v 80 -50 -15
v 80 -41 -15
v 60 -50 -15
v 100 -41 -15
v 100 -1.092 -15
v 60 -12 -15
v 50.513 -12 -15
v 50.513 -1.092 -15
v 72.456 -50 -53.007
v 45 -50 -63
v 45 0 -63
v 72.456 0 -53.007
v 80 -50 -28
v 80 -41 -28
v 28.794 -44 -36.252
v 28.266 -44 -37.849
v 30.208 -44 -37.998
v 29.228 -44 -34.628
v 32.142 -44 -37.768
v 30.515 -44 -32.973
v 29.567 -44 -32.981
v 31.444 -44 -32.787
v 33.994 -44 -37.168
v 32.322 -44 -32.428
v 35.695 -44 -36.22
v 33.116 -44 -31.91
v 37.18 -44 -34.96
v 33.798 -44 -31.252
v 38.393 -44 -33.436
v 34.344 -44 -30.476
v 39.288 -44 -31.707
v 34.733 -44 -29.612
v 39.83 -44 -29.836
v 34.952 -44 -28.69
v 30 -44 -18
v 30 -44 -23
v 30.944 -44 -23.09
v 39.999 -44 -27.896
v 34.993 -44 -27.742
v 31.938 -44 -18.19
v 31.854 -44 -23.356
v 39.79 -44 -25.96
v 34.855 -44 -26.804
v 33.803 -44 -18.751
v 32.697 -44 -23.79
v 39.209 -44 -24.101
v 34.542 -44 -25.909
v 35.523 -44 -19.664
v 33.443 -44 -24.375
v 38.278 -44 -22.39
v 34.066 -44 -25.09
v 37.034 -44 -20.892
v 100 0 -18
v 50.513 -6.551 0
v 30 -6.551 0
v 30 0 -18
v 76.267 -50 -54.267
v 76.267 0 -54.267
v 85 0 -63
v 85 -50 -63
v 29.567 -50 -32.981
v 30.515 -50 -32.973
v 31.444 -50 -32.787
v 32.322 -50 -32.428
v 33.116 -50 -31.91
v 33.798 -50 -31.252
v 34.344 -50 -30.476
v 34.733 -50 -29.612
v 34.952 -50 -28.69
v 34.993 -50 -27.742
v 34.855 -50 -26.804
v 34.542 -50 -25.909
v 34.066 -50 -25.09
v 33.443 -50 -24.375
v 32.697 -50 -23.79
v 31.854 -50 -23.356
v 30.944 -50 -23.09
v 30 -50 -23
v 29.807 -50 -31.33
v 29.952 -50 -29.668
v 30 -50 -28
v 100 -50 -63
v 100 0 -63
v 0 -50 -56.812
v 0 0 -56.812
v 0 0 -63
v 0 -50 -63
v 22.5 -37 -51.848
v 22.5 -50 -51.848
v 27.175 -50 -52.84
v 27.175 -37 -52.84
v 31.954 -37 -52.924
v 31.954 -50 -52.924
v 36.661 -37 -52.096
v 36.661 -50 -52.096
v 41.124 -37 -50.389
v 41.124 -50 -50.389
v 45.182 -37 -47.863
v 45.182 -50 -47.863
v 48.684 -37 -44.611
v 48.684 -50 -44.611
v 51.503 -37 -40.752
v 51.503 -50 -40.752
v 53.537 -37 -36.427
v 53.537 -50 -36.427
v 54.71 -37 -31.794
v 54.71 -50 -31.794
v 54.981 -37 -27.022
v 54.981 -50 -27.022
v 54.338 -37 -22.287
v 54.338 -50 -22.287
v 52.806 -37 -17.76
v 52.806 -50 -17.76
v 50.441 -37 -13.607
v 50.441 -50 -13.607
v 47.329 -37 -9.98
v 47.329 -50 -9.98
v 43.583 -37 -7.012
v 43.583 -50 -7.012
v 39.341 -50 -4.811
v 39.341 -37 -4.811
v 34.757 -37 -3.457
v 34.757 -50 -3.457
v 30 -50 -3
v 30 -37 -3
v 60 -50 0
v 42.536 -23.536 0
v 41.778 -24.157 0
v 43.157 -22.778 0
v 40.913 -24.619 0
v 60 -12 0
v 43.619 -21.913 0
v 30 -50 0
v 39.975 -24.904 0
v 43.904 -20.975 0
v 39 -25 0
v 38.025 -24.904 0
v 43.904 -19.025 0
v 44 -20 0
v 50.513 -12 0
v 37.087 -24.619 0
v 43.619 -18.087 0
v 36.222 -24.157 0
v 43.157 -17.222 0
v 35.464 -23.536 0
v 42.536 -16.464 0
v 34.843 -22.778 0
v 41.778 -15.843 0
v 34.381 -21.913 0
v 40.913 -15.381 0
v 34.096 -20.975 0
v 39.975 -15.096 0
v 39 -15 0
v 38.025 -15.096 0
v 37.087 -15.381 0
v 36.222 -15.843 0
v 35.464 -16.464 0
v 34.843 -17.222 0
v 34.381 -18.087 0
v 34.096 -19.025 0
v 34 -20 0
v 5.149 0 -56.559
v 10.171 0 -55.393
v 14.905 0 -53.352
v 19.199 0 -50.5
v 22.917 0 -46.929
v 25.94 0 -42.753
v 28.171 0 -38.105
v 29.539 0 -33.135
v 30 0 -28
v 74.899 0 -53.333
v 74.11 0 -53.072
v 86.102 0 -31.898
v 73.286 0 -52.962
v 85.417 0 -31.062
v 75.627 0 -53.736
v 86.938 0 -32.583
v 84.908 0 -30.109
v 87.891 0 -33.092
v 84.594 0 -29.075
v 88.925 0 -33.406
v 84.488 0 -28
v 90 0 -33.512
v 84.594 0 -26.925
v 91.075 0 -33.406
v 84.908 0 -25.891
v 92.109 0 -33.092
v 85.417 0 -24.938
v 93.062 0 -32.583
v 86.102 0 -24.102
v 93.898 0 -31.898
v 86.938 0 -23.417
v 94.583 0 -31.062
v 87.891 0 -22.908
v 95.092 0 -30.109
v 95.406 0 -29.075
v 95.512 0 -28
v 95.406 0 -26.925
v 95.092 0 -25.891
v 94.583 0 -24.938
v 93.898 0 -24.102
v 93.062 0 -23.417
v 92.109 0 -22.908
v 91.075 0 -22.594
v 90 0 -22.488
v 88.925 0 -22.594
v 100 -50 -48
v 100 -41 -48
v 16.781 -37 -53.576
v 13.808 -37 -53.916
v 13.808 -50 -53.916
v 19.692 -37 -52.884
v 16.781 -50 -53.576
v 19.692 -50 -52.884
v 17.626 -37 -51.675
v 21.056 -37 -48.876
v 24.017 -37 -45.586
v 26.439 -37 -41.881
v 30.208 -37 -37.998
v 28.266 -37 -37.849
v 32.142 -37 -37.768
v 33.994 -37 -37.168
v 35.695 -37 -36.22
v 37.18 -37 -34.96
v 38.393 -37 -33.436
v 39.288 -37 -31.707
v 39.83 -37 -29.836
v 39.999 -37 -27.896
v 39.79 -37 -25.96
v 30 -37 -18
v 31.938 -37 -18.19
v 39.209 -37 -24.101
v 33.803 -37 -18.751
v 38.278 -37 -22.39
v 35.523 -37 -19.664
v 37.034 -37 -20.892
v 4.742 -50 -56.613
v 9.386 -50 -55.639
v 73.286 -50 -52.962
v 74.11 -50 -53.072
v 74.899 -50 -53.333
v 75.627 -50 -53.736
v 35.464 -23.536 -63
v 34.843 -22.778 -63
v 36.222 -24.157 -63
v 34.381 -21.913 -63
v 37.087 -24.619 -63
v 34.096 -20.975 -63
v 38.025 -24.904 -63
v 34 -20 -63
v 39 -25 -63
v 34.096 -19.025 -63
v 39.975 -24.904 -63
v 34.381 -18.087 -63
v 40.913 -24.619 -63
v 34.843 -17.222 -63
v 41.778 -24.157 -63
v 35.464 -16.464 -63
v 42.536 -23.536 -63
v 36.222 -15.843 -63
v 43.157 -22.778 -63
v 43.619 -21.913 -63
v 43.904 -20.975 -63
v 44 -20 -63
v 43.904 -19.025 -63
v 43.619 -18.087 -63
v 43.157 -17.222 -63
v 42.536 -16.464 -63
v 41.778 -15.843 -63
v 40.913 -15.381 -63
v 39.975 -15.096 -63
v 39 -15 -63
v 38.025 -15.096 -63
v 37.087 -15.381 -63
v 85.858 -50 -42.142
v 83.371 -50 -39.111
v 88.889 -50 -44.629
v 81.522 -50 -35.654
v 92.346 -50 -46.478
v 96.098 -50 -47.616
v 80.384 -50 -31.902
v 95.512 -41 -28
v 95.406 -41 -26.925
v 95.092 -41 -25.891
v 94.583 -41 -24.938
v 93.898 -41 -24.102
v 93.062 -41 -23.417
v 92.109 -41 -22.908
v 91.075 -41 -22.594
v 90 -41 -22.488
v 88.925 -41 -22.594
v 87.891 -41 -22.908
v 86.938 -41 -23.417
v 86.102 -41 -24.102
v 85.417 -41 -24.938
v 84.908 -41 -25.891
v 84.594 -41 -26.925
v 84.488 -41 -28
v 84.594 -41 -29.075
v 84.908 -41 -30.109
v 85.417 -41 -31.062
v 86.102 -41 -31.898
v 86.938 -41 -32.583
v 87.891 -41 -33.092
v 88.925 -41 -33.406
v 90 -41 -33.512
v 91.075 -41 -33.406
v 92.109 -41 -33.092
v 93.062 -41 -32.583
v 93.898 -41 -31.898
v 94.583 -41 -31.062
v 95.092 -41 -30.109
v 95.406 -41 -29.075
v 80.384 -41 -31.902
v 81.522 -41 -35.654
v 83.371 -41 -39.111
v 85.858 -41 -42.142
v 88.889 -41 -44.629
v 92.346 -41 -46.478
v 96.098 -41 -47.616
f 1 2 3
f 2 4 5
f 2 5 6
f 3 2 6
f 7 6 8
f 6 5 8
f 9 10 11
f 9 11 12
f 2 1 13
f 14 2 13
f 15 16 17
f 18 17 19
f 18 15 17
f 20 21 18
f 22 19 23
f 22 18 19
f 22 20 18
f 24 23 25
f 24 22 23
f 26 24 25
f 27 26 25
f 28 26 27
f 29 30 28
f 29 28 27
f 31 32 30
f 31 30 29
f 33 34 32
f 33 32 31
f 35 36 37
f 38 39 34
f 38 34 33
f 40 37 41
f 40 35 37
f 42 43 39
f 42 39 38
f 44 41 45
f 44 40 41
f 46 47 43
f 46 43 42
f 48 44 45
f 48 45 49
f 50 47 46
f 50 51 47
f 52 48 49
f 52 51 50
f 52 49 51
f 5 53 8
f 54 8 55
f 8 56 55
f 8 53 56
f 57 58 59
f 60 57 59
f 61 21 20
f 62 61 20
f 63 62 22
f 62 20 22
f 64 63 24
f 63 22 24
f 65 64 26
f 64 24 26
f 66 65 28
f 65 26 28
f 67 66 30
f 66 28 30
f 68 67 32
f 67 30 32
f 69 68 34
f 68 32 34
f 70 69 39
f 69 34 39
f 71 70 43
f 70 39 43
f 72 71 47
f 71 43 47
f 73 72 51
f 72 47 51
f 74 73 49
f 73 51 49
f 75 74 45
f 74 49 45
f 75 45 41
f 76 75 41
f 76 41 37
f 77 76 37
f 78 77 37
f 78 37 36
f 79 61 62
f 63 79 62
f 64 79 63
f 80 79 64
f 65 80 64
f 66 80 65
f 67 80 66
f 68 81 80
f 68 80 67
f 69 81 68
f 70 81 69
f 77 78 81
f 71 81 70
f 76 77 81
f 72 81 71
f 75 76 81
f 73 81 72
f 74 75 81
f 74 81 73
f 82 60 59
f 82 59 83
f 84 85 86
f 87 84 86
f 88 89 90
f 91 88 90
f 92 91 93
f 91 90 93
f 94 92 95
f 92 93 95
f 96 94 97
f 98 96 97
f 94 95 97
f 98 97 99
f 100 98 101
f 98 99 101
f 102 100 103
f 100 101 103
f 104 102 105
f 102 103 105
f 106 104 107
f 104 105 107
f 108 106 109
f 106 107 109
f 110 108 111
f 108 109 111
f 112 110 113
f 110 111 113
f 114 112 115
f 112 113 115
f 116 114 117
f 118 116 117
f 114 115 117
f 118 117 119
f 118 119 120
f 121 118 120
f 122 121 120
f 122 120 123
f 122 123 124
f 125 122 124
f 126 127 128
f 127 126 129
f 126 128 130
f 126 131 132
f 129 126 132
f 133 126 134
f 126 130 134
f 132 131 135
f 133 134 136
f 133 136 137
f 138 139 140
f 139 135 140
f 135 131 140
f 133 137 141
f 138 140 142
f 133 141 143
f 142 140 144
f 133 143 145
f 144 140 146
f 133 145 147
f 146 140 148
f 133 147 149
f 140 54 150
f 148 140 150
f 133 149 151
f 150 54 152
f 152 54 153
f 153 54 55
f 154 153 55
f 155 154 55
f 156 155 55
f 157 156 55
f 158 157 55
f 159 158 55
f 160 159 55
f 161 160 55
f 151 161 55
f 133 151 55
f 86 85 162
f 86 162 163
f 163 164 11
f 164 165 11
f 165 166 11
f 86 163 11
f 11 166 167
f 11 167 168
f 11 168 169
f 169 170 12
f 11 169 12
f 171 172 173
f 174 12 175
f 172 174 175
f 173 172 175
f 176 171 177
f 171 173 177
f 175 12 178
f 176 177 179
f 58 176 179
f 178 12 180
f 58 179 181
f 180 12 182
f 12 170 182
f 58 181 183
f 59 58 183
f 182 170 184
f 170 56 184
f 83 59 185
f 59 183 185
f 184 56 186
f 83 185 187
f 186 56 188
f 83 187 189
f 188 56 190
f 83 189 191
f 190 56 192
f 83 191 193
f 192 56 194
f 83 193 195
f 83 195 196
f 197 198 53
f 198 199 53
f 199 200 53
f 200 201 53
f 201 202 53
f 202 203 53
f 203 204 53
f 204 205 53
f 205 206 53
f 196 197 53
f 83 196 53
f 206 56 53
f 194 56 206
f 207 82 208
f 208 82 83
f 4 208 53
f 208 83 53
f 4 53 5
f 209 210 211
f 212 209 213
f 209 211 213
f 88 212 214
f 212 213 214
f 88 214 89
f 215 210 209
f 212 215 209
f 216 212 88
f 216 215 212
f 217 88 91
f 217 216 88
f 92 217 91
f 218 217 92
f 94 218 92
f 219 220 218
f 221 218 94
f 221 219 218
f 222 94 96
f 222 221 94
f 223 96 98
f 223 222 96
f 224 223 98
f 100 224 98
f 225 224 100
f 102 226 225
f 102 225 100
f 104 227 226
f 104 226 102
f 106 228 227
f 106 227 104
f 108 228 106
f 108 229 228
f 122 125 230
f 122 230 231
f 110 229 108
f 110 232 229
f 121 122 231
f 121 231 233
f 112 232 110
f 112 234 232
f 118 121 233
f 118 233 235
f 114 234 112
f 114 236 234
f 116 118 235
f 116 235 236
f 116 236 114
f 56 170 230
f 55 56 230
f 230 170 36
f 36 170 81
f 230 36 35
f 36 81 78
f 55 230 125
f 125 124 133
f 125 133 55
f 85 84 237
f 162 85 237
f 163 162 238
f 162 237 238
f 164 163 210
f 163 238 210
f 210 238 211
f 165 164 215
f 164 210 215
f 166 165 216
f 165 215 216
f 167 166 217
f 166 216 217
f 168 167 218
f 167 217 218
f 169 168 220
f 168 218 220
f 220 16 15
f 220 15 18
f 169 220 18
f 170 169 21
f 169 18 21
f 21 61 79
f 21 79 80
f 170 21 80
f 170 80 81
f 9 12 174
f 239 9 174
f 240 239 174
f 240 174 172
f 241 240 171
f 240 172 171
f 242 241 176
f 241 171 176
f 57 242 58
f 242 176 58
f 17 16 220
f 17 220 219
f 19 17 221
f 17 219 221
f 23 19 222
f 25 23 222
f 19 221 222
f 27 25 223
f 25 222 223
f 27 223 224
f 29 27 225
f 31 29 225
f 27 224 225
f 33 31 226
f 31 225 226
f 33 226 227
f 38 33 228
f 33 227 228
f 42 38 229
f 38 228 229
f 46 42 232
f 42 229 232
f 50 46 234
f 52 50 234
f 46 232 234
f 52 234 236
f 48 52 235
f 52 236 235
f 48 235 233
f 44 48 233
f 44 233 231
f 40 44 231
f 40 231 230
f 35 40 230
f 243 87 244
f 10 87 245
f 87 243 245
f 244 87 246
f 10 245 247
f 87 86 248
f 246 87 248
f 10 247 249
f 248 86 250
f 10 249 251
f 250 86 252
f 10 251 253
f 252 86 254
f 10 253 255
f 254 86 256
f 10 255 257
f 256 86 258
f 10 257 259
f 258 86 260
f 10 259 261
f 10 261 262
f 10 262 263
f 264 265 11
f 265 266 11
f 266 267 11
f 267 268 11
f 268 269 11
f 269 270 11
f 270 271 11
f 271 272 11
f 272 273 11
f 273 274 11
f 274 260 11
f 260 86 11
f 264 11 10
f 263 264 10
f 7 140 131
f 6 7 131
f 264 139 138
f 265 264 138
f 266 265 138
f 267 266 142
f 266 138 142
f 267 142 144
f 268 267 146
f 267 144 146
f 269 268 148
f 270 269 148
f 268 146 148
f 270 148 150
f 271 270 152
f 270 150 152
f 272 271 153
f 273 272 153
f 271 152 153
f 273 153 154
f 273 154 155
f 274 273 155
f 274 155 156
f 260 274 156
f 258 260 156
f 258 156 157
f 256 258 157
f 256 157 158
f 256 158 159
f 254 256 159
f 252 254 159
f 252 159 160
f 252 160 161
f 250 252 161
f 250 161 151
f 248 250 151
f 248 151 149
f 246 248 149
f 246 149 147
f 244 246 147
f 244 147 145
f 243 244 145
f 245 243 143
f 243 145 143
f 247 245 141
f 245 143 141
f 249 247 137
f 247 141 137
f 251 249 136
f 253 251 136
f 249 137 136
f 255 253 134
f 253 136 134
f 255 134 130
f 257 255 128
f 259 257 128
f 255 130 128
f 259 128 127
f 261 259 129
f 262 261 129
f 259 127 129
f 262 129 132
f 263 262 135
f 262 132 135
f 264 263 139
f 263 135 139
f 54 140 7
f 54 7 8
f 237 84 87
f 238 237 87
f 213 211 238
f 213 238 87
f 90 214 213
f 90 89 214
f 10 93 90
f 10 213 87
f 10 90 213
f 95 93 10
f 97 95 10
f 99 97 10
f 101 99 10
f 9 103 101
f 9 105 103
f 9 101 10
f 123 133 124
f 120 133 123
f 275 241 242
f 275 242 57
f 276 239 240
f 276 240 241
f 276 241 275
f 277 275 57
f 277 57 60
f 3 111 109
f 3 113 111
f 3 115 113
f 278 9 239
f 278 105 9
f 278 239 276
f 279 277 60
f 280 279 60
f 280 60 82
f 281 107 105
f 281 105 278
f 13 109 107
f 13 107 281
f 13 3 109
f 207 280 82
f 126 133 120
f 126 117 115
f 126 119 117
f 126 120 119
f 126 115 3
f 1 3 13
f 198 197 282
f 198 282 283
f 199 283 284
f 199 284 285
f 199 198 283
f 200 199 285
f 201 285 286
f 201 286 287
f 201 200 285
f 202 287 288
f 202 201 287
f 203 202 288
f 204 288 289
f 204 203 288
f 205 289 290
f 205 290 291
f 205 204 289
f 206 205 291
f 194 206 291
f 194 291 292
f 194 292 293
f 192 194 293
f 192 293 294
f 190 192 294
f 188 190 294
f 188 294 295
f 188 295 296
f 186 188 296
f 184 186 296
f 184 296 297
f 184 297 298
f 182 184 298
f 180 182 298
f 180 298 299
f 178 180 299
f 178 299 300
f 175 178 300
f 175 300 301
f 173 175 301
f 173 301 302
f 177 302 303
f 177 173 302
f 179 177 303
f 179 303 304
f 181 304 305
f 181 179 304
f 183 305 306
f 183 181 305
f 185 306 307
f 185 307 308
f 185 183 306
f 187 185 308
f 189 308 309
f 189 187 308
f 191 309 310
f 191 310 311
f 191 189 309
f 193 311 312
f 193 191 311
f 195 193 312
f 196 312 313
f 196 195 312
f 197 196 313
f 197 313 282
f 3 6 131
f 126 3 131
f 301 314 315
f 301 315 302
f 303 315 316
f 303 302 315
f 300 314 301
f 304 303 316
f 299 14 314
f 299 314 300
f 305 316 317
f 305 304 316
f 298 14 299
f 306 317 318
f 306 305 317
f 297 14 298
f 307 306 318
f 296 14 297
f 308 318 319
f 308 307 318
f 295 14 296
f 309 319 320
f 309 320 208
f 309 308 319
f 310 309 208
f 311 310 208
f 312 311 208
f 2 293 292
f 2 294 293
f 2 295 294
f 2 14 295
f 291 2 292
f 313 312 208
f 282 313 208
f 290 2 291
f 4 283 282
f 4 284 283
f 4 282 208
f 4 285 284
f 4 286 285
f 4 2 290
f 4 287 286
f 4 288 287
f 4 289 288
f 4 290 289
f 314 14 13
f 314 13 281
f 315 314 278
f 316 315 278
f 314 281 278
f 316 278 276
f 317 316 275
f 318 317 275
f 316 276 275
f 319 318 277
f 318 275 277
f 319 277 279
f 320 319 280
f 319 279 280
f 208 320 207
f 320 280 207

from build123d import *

# Parameters (mm, degrees)
F0_R      = 5.5120501068
F1_DEPTH  = 50
F3_DEPTH  = 13
F4_R      = 10
F5_DEPTH  = 7
F6_R      = 5
F7_DEPTH  = 6
F8_R      = 5.5120501068
F9_DEPTH  = 9
F11_DEPTH = 381
F13_DEPTH = 381
F14_W     = 50
F14_H     = 12
F15_DEPTH = 15
F16_R     = 5
F17_DEPTH = 381


with BuildPart() as f1:
    # F0 (on Front) → F1 (new body)
    with BuildSketch(Plane.XZ):
        with BuildLine():
            Line((60, -15), (60, 0))
            Line((60, 0), (0, 0))
            Line((0, 0), (0, -63))
            Line((0, -63), (45, -63))
            Line((45, -63), (72.4561188247, -53.0067899993))
            ThreePointArc((72.4561188247, -53.0067899993), (74.5109412295, -53.1845320084), (76.2667195414, -54.2667195414))
            Line((76.2667195414, -54.2667195414), (85, -63))
            Line((85, -63), (100, -63))
            Line((100, -63), (100, -15))
            Line((100, -15), (60, -15))
        make_face()
        with Locations((90, -28)):
            Circle(F0_R, mode=Mode.SUBTRACT)
    extrude(amount=F1_DEPTH)

    # F2 (on face) → F3 (cut)
    with BuildSketch(Plane.XZ.offset(50)):
        with BuildLine():
            Line((30, 0), (0, 0))
            Line((0, 0), (0, -50.6242252886))
            ThreePointArc((0, -50.6242252886), (11.1042474662, -53.9150696691), (22.5, -51.8484800354))
            ThreePointArc((22.5, -51.8484800354), (54.7104431454, -31.7939424821), (30, -3))
            Line((30, -3), (30, 0))
        make_face()
    extrude(amount=-F3_DEPTH, mode=Mode.SUBTRACT)

    # F4 (on face) → F5 (join)
    with BuildSketch(Plane.XZ.offset(37)):
        with Locations((30, -28)):
            Circle(F4_R)
    extrude(amount=F5_DEPTH)

    # F6 (on face) → F7 (join)
    with BuildSketch(Plane.XZ.offset(44)):
        with Locations((30, -28)):
            Circle(F6_R)
    extrude(amount=F7_DEPTH)

    # F8 (on face) → F9 (cut)
    with BuildSketch(Plane.XZ.offset(50)):
        with BuildLine():
            Line((100, -15), (80, -15))
            Line((80, -15), (80, -28))
            ThreePointArc((80, -28), (85.8578643763, -42.1421356237), (100, -48))
            Line((100, -48), (100, -15))
        make_face()
        with Locations((90, -28)):
            Circle(F8_R, mode=Mode.SUBTRACT)
    extrude(amount=-F9_DEPTH, mode=Mode.SUBTRACT)

    # F10 (on face) → F11 (cut)
    with BuildSketch(Plane.XZ.offset(50)):
        with BuildLine():
            Line((30, 0), (0, 0))
            Line((0, 0), (0, -56.8121126443))
            ThreePointArc((0, -56.8121126443), (21.1383307761, -48.7974627961), (30, -28))
            Line((30, -28), (30, 0))
        make_face()
    extrude(amount=-F11_DEPTH, mode=Mode.SUBTRACT)

    # F12 (on face) → F13 (cut)
    with BuildSketch(Plane(origin=(30, 0, 0), x_dir=(0, -1, 0), z_dir=(-1, 0, 0))):
        Polygon((6.5514642168, 0), (0, 0), (0, -18), align=None)
    extrude(amount=-F13_DEPTH, mode=Mode.SUBTRACT)

    # F14 (on Top) → F15 (cut)
    with BuildSketch(Plane.XY):
        with Locations((75.5128398538, -6)):
            Rectangle(F14_W, F14_H)
    extrude(amount=-F15_DEPTH, mode=Mode.SUBTRACT)

    # F16 (on face) → F17 (cut)
    with BuildSketch(Plane.XY):
        with Locations((39, -20)):
            Circle(F16_R)
    extrude(amount=-F17_DEPTH, mode=Mode.SUBTRACT)


solid = f1.part
